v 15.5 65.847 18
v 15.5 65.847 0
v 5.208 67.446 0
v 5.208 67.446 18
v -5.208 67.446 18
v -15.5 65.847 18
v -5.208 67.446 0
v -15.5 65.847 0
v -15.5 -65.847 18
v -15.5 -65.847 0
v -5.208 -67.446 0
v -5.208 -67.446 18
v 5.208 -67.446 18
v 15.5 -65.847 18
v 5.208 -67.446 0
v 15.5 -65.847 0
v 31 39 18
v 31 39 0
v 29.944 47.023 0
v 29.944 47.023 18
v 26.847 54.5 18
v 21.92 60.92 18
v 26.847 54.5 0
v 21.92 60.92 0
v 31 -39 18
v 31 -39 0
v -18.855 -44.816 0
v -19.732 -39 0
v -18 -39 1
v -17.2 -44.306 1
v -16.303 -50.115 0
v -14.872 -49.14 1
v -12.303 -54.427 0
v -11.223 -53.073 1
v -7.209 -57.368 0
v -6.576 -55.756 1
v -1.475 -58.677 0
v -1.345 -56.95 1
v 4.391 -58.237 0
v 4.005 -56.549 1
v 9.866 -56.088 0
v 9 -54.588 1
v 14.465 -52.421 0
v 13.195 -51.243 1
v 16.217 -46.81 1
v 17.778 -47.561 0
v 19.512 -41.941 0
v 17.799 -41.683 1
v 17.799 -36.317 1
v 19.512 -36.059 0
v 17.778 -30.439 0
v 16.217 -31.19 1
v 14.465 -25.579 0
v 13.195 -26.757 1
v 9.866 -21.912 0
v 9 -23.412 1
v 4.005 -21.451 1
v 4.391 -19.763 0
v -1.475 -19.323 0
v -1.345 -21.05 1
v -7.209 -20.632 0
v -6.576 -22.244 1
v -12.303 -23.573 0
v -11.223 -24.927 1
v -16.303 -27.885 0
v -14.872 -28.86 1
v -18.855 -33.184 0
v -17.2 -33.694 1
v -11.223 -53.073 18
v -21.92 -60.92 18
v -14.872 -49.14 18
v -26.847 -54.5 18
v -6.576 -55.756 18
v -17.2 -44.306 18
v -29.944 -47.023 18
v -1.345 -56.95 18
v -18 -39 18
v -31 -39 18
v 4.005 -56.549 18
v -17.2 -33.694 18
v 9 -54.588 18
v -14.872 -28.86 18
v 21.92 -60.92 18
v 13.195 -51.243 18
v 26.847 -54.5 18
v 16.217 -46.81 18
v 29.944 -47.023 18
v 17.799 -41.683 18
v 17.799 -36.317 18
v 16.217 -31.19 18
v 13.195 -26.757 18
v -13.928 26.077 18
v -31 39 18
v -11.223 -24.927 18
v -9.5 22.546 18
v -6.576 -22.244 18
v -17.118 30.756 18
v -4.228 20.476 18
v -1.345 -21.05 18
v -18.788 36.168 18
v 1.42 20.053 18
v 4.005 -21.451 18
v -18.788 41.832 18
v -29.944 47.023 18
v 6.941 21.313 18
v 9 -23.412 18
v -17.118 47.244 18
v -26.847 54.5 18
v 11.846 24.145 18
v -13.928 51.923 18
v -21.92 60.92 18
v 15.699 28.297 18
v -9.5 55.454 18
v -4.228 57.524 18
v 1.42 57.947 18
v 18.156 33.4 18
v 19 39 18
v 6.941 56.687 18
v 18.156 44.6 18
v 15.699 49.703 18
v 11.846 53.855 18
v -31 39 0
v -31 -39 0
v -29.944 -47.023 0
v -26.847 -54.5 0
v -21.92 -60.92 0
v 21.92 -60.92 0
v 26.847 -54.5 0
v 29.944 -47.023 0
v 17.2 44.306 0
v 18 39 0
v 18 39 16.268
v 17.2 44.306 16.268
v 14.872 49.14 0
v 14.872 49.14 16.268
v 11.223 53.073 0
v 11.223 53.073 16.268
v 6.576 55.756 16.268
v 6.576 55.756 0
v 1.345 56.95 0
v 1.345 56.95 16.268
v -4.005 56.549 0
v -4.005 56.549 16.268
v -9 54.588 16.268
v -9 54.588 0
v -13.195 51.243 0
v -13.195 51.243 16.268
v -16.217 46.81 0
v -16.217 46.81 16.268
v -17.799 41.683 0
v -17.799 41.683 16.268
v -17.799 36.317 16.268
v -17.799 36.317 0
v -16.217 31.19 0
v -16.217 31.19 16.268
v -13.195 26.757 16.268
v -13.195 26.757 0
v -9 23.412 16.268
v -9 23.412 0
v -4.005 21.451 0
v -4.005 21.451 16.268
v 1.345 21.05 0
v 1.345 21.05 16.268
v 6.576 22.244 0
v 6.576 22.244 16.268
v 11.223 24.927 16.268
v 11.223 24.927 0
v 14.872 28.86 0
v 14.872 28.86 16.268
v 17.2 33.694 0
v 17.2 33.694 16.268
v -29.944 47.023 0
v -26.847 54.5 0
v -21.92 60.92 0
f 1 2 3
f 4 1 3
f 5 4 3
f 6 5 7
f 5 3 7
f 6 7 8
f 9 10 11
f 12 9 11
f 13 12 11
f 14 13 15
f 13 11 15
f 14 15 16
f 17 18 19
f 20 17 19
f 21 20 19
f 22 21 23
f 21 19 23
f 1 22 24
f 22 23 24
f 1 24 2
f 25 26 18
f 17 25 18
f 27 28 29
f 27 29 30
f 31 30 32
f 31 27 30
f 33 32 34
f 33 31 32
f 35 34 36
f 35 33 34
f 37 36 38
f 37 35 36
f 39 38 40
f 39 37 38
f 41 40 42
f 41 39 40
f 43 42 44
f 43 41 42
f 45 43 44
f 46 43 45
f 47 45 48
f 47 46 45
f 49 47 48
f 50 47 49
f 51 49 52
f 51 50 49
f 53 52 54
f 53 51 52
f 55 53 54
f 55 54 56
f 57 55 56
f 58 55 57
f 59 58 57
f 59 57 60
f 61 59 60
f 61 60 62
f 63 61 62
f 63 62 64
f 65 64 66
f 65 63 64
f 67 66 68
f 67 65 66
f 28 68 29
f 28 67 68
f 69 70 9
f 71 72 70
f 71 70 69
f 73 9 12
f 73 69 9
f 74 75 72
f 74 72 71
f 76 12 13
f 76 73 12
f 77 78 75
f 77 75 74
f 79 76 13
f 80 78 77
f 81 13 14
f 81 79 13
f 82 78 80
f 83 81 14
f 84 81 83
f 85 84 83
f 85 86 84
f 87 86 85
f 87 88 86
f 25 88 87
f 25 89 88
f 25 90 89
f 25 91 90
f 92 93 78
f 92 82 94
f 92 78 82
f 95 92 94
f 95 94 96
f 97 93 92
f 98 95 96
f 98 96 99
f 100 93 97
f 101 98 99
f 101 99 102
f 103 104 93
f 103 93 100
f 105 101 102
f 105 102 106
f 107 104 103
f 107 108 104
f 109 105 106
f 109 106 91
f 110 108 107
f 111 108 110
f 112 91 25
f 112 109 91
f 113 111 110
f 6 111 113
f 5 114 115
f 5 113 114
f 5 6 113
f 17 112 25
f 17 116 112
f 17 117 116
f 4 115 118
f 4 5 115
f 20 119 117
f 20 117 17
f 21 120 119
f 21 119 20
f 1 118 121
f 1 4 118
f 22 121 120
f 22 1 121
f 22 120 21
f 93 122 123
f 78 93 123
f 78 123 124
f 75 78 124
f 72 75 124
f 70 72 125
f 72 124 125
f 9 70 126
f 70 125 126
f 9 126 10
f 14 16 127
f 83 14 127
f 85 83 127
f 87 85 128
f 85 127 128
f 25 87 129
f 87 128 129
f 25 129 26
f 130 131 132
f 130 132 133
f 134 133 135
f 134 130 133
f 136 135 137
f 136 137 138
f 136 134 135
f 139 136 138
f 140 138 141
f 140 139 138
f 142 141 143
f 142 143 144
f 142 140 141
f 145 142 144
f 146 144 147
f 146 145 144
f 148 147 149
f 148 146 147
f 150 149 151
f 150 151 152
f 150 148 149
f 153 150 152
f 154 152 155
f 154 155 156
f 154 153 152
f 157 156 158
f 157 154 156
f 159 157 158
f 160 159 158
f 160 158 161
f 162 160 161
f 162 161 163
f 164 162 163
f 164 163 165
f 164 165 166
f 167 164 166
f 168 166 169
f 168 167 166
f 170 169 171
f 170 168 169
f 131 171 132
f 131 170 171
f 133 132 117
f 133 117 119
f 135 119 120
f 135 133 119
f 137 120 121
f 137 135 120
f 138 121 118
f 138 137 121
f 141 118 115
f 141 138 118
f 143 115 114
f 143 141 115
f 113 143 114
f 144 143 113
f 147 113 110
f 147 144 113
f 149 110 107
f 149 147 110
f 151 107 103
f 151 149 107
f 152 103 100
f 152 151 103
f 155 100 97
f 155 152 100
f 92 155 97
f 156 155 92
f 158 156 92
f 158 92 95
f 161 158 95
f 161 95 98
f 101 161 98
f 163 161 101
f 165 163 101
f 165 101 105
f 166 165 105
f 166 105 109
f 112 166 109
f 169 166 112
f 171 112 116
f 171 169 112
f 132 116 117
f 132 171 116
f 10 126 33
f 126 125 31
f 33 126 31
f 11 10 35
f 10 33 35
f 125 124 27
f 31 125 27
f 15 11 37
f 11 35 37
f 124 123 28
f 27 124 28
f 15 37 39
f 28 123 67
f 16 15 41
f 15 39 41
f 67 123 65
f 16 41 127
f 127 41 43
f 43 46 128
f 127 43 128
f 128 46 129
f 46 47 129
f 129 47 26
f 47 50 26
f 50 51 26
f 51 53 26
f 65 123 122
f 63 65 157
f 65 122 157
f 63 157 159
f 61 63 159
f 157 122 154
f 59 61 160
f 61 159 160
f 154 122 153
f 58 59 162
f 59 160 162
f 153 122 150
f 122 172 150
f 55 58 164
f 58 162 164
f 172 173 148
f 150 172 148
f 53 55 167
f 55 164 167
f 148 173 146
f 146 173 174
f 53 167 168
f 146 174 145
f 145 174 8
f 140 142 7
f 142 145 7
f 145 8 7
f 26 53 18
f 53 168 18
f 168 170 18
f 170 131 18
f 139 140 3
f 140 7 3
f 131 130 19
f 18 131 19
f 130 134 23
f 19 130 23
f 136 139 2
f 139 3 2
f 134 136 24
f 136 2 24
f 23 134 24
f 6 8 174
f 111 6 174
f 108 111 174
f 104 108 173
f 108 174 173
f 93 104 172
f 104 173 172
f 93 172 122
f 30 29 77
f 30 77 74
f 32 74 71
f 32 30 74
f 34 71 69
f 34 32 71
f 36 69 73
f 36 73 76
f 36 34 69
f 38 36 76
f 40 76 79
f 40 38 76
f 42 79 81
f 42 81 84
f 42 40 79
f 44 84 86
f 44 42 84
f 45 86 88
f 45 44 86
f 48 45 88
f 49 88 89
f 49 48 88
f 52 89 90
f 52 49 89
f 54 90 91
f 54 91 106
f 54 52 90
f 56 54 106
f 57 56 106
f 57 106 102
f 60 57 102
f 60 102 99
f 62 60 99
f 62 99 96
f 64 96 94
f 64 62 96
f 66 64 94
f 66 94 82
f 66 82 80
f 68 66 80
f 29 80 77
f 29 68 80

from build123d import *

# Parameters (mm, degrees)
SKETCH_1_R      = 18
EXTRUDE_1_DEPTH = 18
CHAMFER_1_SIZE  = 1
CHAMFER_1_SIZE2 = 1.732050808
CHAMFER_2_SIZE  = 1
CHAMFER_2_SIZE2 = 1.732050808


with BuildPart() as part:
    # Эскиз1 → Бобышка-Вытянуть1 (new body)
    with BuildSketch(Plane.XY):
        with BuildLine():
            Line((-31, 39), (-31, -39))
            ThreePointArc((-31, -39), (-26.846787517, -54.5), (-15.5, -65.846787517))
            ThreePointArc((-15.5, -65.846787517), (0, -67.64650343), (15.5, -65.846787517))
            ThreePointArc((15.5, -65.846787517), (26.846787517, -54.5), (31, -39))
            Line((31, -39), (31, 39))
            ThreePointArc((31, 39), (26.846787517, 54.5), (15.5, 65.846787517))
            ThreePointArc((15.5, 65.846787517), (0, 67.64650343), (-15.5, 65.846787517))
            ThreePointArc((-15.5, 65.846787517), (-26.846787517, 54.5), (-31, 39))
        make_face()
        with Locations((0, 39)):
            Circle(SKETCH_1_R, mode=Mode.SUBTRACT)
        with Locations(Location((0, -39, 0), (0, 0, 180))):
            Circle(SKETCH_1_R, mode=Mode.SUBTRACT)
    extrude(amount=EXTRUDE_1_DEPTH)

    # Фаска1
    chamfer_1_edges = [part.edges().sort_by_distance(p)[0] for p in [
        (-18, 39, 18),
    ]]
    chamfer_1_side = [part.faces().sort_by_distance(p)[0] for p in [
        (0, 0, 18),
    ]]
    chamfer(chamfer_1_edges, length=CHAMFER_1_SIZE, length2=CHAMFER_1_SIZE2, reference=chamfer_1_side[0])

    # Фаска2
    chamfer_2_edges = [part.edges().sort_by_distance(p)[0] for p in [
        (18, -39, 0),
    ]]
    chamfer_2_side = [part.faces().sort_by_distance(p)[0] for p in [
        (18, -39, 9),
    ]]
    chamfer(chamfer_2_edges, length=CHAMFER_2_SIZE, length2=CHAMFER_2_SIZE2, reference=chamfer_2_side[0])


solid = part.part
